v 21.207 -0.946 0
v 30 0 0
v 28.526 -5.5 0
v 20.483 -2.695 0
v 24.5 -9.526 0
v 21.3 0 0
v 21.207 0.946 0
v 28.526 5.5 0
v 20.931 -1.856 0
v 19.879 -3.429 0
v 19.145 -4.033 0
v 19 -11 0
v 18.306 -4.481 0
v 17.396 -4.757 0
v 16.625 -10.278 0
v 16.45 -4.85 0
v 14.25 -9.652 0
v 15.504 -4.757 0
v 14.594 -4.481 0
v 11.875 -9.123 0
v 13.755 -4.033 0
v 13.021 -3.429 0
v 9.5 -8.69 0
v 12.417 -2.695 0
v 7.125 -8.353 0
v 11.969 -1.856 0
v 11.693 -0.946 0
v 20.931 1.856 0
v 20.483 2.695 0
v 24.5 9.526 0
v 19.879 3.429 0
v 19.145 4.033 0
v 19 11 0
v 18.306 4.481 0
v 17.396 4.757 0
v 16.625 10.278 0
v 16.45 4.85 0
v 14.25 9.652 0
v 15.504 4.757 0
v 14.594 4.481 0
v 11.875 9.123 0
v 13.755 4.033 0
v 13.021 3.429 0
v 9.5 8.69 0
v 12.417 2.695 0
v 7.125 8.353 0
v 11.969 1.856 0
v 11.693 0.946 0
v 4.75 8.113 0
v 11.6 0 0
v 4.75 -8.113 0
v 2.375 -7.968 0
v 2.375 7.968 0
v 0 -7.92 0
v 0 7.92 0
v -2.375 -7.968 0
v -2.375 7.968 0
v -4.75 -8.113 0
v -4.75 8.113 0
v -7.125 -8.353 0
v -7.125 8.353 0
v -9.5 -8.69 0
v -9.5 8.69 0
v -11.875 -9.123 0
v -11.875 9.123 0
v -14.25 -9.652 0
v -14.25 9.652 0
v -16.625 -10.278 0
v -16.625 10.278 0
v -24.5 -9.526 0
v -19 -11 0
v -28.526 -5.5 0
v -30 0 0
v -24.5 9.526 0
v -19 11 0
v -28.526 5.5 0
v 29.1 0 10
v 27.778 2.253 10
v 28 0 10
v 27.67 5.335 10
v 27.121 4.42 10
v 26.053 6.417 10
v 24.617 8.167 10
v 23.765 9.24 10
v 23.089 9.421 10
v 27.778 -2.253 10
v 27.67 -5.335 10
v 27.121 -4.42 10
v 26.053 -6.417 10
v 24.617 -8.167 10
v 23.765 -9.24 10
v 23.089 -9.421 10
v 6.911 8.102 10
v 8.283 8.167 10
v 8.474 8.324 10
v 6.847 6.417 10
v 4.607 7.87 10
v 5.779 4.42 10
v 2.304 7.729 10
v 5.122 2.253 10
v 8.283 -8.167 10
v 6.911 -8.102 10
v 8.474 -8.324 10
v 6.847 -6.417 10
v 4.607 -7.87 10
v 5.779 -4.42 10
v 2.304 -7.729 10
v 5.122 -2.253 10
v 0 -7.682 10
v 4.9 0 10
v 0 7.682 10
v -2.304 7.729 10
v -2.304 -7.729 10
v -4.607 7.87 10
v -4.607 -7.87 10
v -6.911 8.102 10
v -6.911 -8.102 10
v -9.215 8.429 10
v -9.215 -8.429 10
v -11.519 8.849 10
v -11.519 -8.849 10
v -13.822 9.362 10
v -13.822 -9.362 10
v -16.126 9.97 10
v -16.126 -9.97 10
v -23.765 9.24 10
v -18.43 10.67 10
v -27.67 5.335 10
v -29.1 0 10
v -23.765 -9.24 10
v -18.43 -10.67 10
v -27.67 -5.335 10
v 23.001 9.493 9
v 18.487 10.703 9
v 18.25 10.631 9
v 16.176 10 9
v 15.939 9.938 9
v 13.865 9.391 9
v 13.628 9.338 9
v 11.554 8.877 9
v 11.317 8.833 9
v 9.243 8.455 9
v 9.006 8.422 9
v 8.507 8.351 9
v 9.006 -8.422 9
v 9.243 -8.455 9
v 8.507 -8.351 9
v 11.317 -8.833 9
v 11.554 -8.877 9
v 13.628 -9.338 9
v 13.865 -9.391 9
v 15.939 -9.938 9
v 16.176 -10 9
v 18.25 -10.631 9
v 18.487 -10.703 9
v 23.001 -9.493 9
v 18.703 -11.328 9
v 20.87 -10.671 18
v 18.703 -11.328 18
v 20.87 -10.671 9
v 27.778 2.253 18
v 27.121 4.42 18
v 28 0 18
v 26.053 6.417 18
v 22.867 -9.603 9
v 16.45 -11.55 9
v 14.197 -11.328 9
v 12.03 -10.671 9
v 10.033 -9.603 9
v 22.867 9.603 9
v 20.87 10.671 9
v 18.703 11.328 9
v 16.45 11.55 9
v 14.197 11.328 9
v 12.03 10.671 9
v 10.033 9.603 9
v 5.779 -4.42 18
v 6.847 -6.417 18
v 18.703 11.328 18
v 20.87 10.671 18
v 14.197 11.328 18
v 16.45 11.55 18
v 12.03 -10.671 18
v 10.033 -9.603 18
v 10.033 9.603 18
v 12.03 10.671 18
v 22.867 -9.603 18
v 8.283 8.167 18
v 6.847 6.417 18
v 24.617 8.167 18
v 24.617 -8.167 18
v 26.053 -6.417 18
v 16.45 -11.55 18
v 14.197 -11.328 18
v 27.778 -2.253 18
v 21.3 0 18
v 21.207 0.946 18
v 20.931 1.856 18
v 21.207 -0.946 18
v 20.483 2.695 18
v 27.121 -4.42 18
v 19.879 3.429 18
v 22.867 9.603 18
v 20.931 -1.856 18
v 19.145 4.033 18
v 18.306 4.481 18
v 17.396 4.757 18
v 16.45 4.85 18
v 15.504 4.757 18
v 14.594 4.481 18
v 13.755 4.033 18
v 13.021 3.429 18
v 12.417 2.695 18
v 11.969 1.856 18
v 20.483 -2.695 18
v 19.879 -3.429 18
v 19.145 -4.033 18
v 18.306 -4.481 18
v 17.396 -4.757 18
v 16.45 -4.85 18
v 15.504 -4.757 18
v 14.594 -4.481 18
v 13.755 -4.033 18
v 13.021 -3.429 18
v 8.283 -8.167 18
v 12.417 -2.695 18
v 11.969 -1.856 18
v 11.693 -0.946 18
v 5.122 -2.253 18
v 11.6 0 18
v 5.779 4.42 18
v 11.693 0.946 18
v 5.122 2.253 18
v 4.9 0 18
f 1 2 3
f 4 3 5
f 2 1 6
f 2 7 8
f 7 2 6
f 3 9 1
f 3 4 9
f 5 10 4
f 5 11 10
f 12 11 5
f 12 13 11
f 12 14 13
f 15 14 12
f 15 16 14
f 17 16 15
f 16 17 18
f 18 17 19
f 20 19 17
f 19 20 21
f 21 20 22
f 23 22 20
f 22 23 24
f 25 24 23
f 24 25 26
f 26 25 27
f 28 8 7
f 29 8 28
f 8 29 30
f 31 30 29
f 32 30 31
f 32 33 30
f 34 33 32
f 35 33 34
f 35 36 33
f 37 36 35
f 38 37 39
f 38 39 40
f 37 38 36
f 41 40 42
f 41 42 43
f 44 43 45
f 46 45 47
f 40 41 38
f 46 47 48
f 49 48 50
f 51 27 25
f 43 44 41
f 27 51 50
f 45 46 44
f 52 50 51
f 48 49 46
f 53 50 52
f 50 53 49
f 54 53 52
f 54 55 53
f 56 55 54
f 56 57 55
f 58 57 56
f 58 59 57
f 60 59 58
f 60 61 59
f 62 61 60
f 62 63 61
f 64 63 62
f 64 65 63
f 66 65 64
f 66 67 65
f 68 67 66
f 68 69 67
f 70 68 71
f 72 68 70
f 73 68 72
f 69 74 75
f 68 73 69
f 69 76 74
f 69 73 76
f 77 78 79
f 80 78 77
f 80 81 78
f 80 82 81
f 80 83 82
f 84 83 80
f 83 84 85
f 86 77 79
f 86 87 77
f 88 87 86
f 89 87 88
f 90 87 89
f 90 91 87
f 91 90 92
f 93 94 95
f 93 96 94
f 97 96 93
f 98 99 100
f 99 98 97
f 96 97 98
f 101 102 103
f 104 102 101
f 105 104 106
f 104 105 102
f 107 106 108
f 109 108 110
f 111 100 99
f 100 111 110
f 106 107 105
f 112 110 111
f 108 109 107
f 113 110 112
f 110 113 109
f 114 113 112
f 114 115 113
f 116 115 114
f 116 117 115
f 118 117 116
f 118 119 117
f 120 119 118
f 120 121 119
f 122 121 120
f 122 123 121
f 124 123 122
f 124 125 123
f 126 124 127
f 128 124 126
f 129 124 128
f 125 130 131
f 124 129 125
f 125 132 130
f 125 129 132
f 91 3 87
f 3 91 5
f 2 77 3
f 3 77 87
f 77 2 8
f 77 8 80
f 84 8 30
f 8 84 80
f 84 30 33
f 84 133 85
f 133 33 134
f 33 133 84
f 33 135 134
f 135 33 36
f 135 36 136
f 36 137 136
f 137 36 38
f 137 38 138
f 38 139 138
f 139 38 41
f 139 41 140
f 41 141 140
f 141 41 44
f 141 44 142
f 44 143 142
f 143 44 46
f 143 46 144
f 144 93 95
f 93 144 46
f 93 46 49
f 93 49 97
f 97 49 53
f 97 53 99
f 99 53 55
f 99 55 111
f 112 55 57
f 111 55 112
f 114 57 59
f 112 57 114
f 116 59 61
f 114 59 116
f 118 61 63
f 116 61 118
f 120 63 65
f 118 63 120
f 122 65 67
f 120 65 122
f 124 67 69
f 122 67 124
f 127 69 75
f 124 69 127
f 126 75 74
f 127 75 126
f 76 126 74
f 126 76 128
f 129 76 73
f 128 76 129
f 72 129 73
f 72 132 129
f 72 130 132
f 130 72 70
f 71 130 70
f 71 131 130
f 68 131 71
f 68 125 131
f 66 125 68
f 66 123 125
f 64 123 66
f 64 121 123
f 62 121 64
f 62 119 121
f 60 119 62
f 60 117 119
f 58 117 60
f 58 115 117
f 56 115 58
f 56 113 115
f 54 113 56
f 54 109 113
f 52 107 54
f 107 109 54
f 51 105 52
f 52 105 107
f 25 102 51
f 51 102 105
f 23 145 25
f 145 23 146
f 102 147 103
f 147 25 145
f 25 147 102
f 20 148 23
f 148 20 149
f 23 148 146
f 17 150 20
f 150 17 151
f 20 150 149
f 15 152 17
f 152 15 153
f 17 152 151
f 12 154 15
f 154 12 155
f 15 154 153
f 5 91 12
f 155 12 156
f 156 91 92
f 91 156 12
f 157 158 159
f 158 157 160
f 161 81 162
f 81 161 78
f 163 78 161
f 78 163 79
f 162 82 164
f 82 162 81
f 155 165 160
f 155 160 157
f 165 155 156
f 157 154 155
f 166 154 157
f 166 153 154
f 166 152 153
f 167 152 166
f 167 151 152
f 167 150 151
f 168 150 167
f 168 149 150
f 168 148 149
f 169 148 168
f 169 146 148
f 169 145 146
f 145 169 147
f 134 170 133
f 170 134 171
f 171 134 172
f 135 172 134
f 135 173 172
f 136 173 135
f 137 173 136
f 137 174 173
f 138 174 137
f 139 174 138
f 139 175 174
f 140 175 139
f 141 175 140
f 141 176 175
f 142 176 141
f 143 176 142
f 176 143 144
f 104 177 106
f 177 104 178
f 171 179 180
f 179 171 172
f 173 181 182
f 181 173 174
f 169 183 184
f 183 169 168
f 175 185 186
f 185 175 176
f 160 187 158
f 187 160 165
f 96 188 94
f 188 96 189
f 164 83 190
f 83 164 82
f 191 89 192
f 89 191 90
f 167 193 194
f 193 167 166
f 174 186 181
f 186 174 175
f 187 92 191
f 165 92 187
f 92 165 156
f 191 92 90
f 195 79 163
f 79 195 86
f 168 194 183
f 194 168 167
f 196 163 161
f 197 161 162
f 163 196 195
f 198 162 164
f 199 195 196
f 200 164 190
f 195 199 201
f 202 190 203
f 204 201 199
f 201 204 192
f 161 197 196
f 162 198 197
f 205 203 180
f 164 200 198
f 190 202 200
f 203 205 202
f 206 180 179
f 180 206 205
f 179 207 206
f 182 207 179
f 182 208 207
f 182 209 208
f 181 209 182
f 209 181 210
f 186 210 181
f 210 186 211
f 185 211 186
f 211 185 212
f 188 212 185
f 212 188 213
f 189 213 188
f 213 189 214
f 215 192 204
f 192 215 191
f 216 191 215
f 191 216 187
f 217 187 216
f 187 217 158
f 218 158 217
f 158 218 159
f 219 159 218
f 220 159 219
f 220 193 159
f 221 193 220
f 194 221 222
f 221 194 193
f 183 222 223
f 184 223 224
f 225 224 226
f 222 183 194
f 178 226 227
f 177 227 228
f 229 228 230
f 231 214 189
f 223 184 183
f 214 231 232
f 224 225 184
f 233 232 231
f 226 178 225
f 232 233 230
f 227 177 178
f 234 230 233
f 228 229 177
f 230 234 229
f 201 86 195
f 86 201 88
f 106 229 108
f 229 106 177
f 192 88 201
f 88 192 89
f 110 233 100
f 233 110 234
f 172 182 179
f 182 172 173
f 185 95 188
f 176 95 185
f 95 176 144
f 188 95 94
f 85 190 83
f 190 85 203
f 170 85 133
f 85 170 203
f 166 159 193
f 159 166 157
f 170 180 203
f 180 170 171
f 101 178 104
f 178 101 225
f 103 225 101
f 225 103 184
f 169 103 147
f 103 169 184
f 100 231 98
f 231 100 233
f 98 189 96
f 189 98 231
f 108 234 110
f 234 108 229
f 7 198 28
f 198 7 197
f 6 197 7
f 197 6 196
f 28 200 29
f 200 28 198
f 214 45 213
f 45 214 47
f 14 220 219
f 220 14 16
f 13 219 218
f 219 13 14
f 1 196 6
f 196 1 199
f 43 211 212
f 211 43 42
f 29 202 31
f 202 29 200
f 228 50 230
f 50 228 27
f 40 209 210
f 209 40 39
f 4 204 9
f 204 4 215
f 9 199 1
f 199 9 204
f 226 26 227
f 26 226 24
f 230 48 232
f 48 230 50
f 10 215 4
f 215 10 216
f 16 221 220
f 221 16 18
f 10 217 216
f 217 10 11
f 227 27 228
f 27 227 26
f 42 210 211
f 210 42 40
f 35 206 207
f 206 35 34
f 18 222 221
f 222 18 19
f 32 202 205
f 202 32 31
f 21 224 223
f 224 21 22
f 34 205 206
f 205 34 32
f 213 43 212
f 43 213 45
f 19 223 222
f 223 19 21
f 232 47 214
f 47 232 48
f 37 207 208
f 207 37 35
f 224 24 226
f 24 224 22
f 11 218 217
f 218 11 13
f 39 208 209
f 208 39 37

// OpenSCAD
$fn = 32;

// ----------------------------------------------------------------------
// Handle: 60 x 22 mm grip, 10 mm thick
// ----------------------------------------------------------------------

// --- parameters (mm) ---
length = 60;              // grip length
width = 22;               // grip width
thickness = 10;           // grip thickness
waist = 0.72;             // width factor at the middle
draft = 0.97;             // top face scale of the extrusion
boss_d = 23.1;            // mounting boss diameter
boss_h = 8;               // mounting boss height
boss_hole_d = 9.7;        // screw clearance through the boss
boss_r = 16.45;           // boss centre from the grip centre

/* ergonomic grip outline, closed spline-like polygon in the XY plane */
grip = [[-19, 11], [-16.625, 10.278], [-14.25, 9.652], [-11.875, 9.123], [-9.5, 8.69], [-7.125, 8.353], [-4.75, 8.113], [-2.375, 7.968], [0, 7.92], [2.375, 7.968], [4.75, 8.113], [7.125, 8.353], [9.5, 8.69], [11.875, 9.123], [14.25, 9.652], [16.625, 10.278], [19, 11], [24.5, 9.526], [28.526, 5.5], [30, 0], [28.526, -5.5], [24.5, -9.526], [19, -11], [19, -11], [16.625, -10.278], [14.25, -9.652], [11.875, -9.123], [9.5, -8.69], [7.125, -8.353], [4.75, -8.113], [2.375, -7.968], [0, -7.92], [-2.375, -7.968], [-4.75, -8.113], [-7.125, -8.353], [-9.5, -8.69], [-11.875, -9.123], [-14.25, -9.652], [-16.625, -10.278], [-19, -11], [-24.5, -9.526], [-28.526, -5.5], [-30, 0], [-28.526, 5.5], [-24.5, 9.526], [-19, 11]];

module grip_body() {
  linear_extrude(height = thickness, scale = draft) polygon(grip);
}

module boss_body() {
  /* sunk 1 mm into the grip so the joint overlaps */
  translate([boss_r, 0, thickness - 1]) cylinder(h = boss_h + 1, d = boss_d);
}

difference() {
  union() {
    grip_body();
    boss_body();
  }
  translate([boss_r, 0, -1]) cylinder(h = thickness + boss_h + 2, d = boss_hole_d);
}
